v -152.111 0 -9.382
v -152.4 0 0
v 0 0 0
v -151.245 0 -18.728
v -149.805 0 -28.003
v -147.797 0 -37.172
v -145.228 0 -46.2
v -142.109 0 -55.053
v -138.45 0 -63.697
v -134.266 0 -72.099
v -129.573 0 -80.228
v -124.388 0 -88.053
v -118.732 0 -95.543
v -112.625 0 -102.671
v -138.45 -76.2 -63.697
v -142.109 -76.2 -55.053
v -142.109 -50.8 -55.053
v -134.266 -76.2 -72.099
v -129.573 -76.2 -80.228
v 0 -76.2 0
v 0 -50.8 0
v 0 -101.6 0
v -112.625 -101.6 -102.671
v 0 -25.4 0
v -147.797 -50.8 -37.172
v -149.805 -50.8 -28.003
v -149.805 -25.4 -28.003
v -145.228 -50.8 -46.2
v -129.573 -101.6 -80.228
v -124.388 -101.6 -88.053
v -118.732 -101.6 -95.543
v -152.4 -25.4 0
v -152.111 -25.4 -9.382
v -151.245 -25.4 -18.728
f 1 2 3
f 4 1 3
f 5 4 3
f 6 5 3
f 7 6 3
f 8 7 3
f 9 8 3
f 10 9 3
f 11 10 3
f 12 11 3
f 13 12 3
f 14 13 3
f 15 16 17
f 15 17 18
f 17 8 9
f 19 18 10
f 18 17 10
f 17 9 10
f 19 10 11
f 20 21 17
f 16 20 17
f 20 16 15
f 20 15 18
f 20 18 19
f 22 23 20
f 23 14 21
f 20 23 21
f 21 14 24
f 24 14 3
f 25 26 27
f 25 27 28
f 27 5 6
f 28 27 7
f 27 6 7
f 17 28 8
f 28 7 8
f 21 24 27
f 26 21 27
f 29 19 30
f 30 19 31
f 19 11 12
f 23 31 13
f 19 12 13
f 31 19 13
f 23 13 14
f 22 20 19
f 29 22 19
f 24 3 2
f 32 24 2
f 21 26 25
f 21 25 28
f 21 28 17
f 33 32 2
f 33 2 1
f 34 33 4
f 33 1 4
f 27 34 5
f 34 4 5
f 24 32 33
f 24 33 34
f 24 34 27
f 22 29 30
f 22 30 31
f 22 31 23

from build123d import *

# Parameters (mm, degrees)
F1_DEPTH = 25.4
F2_DEPTH = 50.8
F3_DEPTH = 76.2
F4_DEPTH = 101.6


with BuildPart() as f1:
    # F0 (on Front) → F1 (new body)
    with BuildSketch(Plane.XZ):
        with BuildLine():
            Line((0, 0), (-152.4, 0))
            ThreePointArc((-152.4, 0), (-151.749888, -14.061698), (-149.8051, -28.003427))
            Line((-149.8051, -28.003427), (0, 0))
        make_face()
    extrude(amount=F1_DEPTH)

    # F0 (on Front) → F2 (join)
    with BuildSketch(Plane.XZ):
        with BuildLine():
            Line((-142.108768, -55.05323), (0, 0))
            Line((0, 0), (-149.8051, -28.003427))
            ThreePointArc((-149.8051, -28.003427), (-146.582228, -41.70624), (-142.108768, -55.05323))
        make_face()
    extrude(amount=F2_DEPTH)

    # F0 (on Front) → F3 (join)
    with BuildSketch(Plane.XZ):
        with BuildLine():
            Line((-129.573091, -80.228262), (0, 0))
            Line((0, 0), (-142.108768, -55.05323))
            ThreePointArc((-142.108768, -55.05323), (-136.422886, -67.930525), (-129.573091, -80.228262))
        make_face()
    extrude(amount=F3_DEPTH)

    # F0 (on Front) → F4 (join)
    with BuildSketch(Plane.XZ):
        with BuildLine():
            Line((-112.624959, -102.671216), (0, 0))
            Line((0, 0), (-129.573091, -80.228262))
            ThreePointArc((-129.573091, -80.228262), (-121.617825, -91.841519), (-112.624959, -102.671216))
        make_face()
    extrude(amount=F4_DEPTH)


solid = f1.part
